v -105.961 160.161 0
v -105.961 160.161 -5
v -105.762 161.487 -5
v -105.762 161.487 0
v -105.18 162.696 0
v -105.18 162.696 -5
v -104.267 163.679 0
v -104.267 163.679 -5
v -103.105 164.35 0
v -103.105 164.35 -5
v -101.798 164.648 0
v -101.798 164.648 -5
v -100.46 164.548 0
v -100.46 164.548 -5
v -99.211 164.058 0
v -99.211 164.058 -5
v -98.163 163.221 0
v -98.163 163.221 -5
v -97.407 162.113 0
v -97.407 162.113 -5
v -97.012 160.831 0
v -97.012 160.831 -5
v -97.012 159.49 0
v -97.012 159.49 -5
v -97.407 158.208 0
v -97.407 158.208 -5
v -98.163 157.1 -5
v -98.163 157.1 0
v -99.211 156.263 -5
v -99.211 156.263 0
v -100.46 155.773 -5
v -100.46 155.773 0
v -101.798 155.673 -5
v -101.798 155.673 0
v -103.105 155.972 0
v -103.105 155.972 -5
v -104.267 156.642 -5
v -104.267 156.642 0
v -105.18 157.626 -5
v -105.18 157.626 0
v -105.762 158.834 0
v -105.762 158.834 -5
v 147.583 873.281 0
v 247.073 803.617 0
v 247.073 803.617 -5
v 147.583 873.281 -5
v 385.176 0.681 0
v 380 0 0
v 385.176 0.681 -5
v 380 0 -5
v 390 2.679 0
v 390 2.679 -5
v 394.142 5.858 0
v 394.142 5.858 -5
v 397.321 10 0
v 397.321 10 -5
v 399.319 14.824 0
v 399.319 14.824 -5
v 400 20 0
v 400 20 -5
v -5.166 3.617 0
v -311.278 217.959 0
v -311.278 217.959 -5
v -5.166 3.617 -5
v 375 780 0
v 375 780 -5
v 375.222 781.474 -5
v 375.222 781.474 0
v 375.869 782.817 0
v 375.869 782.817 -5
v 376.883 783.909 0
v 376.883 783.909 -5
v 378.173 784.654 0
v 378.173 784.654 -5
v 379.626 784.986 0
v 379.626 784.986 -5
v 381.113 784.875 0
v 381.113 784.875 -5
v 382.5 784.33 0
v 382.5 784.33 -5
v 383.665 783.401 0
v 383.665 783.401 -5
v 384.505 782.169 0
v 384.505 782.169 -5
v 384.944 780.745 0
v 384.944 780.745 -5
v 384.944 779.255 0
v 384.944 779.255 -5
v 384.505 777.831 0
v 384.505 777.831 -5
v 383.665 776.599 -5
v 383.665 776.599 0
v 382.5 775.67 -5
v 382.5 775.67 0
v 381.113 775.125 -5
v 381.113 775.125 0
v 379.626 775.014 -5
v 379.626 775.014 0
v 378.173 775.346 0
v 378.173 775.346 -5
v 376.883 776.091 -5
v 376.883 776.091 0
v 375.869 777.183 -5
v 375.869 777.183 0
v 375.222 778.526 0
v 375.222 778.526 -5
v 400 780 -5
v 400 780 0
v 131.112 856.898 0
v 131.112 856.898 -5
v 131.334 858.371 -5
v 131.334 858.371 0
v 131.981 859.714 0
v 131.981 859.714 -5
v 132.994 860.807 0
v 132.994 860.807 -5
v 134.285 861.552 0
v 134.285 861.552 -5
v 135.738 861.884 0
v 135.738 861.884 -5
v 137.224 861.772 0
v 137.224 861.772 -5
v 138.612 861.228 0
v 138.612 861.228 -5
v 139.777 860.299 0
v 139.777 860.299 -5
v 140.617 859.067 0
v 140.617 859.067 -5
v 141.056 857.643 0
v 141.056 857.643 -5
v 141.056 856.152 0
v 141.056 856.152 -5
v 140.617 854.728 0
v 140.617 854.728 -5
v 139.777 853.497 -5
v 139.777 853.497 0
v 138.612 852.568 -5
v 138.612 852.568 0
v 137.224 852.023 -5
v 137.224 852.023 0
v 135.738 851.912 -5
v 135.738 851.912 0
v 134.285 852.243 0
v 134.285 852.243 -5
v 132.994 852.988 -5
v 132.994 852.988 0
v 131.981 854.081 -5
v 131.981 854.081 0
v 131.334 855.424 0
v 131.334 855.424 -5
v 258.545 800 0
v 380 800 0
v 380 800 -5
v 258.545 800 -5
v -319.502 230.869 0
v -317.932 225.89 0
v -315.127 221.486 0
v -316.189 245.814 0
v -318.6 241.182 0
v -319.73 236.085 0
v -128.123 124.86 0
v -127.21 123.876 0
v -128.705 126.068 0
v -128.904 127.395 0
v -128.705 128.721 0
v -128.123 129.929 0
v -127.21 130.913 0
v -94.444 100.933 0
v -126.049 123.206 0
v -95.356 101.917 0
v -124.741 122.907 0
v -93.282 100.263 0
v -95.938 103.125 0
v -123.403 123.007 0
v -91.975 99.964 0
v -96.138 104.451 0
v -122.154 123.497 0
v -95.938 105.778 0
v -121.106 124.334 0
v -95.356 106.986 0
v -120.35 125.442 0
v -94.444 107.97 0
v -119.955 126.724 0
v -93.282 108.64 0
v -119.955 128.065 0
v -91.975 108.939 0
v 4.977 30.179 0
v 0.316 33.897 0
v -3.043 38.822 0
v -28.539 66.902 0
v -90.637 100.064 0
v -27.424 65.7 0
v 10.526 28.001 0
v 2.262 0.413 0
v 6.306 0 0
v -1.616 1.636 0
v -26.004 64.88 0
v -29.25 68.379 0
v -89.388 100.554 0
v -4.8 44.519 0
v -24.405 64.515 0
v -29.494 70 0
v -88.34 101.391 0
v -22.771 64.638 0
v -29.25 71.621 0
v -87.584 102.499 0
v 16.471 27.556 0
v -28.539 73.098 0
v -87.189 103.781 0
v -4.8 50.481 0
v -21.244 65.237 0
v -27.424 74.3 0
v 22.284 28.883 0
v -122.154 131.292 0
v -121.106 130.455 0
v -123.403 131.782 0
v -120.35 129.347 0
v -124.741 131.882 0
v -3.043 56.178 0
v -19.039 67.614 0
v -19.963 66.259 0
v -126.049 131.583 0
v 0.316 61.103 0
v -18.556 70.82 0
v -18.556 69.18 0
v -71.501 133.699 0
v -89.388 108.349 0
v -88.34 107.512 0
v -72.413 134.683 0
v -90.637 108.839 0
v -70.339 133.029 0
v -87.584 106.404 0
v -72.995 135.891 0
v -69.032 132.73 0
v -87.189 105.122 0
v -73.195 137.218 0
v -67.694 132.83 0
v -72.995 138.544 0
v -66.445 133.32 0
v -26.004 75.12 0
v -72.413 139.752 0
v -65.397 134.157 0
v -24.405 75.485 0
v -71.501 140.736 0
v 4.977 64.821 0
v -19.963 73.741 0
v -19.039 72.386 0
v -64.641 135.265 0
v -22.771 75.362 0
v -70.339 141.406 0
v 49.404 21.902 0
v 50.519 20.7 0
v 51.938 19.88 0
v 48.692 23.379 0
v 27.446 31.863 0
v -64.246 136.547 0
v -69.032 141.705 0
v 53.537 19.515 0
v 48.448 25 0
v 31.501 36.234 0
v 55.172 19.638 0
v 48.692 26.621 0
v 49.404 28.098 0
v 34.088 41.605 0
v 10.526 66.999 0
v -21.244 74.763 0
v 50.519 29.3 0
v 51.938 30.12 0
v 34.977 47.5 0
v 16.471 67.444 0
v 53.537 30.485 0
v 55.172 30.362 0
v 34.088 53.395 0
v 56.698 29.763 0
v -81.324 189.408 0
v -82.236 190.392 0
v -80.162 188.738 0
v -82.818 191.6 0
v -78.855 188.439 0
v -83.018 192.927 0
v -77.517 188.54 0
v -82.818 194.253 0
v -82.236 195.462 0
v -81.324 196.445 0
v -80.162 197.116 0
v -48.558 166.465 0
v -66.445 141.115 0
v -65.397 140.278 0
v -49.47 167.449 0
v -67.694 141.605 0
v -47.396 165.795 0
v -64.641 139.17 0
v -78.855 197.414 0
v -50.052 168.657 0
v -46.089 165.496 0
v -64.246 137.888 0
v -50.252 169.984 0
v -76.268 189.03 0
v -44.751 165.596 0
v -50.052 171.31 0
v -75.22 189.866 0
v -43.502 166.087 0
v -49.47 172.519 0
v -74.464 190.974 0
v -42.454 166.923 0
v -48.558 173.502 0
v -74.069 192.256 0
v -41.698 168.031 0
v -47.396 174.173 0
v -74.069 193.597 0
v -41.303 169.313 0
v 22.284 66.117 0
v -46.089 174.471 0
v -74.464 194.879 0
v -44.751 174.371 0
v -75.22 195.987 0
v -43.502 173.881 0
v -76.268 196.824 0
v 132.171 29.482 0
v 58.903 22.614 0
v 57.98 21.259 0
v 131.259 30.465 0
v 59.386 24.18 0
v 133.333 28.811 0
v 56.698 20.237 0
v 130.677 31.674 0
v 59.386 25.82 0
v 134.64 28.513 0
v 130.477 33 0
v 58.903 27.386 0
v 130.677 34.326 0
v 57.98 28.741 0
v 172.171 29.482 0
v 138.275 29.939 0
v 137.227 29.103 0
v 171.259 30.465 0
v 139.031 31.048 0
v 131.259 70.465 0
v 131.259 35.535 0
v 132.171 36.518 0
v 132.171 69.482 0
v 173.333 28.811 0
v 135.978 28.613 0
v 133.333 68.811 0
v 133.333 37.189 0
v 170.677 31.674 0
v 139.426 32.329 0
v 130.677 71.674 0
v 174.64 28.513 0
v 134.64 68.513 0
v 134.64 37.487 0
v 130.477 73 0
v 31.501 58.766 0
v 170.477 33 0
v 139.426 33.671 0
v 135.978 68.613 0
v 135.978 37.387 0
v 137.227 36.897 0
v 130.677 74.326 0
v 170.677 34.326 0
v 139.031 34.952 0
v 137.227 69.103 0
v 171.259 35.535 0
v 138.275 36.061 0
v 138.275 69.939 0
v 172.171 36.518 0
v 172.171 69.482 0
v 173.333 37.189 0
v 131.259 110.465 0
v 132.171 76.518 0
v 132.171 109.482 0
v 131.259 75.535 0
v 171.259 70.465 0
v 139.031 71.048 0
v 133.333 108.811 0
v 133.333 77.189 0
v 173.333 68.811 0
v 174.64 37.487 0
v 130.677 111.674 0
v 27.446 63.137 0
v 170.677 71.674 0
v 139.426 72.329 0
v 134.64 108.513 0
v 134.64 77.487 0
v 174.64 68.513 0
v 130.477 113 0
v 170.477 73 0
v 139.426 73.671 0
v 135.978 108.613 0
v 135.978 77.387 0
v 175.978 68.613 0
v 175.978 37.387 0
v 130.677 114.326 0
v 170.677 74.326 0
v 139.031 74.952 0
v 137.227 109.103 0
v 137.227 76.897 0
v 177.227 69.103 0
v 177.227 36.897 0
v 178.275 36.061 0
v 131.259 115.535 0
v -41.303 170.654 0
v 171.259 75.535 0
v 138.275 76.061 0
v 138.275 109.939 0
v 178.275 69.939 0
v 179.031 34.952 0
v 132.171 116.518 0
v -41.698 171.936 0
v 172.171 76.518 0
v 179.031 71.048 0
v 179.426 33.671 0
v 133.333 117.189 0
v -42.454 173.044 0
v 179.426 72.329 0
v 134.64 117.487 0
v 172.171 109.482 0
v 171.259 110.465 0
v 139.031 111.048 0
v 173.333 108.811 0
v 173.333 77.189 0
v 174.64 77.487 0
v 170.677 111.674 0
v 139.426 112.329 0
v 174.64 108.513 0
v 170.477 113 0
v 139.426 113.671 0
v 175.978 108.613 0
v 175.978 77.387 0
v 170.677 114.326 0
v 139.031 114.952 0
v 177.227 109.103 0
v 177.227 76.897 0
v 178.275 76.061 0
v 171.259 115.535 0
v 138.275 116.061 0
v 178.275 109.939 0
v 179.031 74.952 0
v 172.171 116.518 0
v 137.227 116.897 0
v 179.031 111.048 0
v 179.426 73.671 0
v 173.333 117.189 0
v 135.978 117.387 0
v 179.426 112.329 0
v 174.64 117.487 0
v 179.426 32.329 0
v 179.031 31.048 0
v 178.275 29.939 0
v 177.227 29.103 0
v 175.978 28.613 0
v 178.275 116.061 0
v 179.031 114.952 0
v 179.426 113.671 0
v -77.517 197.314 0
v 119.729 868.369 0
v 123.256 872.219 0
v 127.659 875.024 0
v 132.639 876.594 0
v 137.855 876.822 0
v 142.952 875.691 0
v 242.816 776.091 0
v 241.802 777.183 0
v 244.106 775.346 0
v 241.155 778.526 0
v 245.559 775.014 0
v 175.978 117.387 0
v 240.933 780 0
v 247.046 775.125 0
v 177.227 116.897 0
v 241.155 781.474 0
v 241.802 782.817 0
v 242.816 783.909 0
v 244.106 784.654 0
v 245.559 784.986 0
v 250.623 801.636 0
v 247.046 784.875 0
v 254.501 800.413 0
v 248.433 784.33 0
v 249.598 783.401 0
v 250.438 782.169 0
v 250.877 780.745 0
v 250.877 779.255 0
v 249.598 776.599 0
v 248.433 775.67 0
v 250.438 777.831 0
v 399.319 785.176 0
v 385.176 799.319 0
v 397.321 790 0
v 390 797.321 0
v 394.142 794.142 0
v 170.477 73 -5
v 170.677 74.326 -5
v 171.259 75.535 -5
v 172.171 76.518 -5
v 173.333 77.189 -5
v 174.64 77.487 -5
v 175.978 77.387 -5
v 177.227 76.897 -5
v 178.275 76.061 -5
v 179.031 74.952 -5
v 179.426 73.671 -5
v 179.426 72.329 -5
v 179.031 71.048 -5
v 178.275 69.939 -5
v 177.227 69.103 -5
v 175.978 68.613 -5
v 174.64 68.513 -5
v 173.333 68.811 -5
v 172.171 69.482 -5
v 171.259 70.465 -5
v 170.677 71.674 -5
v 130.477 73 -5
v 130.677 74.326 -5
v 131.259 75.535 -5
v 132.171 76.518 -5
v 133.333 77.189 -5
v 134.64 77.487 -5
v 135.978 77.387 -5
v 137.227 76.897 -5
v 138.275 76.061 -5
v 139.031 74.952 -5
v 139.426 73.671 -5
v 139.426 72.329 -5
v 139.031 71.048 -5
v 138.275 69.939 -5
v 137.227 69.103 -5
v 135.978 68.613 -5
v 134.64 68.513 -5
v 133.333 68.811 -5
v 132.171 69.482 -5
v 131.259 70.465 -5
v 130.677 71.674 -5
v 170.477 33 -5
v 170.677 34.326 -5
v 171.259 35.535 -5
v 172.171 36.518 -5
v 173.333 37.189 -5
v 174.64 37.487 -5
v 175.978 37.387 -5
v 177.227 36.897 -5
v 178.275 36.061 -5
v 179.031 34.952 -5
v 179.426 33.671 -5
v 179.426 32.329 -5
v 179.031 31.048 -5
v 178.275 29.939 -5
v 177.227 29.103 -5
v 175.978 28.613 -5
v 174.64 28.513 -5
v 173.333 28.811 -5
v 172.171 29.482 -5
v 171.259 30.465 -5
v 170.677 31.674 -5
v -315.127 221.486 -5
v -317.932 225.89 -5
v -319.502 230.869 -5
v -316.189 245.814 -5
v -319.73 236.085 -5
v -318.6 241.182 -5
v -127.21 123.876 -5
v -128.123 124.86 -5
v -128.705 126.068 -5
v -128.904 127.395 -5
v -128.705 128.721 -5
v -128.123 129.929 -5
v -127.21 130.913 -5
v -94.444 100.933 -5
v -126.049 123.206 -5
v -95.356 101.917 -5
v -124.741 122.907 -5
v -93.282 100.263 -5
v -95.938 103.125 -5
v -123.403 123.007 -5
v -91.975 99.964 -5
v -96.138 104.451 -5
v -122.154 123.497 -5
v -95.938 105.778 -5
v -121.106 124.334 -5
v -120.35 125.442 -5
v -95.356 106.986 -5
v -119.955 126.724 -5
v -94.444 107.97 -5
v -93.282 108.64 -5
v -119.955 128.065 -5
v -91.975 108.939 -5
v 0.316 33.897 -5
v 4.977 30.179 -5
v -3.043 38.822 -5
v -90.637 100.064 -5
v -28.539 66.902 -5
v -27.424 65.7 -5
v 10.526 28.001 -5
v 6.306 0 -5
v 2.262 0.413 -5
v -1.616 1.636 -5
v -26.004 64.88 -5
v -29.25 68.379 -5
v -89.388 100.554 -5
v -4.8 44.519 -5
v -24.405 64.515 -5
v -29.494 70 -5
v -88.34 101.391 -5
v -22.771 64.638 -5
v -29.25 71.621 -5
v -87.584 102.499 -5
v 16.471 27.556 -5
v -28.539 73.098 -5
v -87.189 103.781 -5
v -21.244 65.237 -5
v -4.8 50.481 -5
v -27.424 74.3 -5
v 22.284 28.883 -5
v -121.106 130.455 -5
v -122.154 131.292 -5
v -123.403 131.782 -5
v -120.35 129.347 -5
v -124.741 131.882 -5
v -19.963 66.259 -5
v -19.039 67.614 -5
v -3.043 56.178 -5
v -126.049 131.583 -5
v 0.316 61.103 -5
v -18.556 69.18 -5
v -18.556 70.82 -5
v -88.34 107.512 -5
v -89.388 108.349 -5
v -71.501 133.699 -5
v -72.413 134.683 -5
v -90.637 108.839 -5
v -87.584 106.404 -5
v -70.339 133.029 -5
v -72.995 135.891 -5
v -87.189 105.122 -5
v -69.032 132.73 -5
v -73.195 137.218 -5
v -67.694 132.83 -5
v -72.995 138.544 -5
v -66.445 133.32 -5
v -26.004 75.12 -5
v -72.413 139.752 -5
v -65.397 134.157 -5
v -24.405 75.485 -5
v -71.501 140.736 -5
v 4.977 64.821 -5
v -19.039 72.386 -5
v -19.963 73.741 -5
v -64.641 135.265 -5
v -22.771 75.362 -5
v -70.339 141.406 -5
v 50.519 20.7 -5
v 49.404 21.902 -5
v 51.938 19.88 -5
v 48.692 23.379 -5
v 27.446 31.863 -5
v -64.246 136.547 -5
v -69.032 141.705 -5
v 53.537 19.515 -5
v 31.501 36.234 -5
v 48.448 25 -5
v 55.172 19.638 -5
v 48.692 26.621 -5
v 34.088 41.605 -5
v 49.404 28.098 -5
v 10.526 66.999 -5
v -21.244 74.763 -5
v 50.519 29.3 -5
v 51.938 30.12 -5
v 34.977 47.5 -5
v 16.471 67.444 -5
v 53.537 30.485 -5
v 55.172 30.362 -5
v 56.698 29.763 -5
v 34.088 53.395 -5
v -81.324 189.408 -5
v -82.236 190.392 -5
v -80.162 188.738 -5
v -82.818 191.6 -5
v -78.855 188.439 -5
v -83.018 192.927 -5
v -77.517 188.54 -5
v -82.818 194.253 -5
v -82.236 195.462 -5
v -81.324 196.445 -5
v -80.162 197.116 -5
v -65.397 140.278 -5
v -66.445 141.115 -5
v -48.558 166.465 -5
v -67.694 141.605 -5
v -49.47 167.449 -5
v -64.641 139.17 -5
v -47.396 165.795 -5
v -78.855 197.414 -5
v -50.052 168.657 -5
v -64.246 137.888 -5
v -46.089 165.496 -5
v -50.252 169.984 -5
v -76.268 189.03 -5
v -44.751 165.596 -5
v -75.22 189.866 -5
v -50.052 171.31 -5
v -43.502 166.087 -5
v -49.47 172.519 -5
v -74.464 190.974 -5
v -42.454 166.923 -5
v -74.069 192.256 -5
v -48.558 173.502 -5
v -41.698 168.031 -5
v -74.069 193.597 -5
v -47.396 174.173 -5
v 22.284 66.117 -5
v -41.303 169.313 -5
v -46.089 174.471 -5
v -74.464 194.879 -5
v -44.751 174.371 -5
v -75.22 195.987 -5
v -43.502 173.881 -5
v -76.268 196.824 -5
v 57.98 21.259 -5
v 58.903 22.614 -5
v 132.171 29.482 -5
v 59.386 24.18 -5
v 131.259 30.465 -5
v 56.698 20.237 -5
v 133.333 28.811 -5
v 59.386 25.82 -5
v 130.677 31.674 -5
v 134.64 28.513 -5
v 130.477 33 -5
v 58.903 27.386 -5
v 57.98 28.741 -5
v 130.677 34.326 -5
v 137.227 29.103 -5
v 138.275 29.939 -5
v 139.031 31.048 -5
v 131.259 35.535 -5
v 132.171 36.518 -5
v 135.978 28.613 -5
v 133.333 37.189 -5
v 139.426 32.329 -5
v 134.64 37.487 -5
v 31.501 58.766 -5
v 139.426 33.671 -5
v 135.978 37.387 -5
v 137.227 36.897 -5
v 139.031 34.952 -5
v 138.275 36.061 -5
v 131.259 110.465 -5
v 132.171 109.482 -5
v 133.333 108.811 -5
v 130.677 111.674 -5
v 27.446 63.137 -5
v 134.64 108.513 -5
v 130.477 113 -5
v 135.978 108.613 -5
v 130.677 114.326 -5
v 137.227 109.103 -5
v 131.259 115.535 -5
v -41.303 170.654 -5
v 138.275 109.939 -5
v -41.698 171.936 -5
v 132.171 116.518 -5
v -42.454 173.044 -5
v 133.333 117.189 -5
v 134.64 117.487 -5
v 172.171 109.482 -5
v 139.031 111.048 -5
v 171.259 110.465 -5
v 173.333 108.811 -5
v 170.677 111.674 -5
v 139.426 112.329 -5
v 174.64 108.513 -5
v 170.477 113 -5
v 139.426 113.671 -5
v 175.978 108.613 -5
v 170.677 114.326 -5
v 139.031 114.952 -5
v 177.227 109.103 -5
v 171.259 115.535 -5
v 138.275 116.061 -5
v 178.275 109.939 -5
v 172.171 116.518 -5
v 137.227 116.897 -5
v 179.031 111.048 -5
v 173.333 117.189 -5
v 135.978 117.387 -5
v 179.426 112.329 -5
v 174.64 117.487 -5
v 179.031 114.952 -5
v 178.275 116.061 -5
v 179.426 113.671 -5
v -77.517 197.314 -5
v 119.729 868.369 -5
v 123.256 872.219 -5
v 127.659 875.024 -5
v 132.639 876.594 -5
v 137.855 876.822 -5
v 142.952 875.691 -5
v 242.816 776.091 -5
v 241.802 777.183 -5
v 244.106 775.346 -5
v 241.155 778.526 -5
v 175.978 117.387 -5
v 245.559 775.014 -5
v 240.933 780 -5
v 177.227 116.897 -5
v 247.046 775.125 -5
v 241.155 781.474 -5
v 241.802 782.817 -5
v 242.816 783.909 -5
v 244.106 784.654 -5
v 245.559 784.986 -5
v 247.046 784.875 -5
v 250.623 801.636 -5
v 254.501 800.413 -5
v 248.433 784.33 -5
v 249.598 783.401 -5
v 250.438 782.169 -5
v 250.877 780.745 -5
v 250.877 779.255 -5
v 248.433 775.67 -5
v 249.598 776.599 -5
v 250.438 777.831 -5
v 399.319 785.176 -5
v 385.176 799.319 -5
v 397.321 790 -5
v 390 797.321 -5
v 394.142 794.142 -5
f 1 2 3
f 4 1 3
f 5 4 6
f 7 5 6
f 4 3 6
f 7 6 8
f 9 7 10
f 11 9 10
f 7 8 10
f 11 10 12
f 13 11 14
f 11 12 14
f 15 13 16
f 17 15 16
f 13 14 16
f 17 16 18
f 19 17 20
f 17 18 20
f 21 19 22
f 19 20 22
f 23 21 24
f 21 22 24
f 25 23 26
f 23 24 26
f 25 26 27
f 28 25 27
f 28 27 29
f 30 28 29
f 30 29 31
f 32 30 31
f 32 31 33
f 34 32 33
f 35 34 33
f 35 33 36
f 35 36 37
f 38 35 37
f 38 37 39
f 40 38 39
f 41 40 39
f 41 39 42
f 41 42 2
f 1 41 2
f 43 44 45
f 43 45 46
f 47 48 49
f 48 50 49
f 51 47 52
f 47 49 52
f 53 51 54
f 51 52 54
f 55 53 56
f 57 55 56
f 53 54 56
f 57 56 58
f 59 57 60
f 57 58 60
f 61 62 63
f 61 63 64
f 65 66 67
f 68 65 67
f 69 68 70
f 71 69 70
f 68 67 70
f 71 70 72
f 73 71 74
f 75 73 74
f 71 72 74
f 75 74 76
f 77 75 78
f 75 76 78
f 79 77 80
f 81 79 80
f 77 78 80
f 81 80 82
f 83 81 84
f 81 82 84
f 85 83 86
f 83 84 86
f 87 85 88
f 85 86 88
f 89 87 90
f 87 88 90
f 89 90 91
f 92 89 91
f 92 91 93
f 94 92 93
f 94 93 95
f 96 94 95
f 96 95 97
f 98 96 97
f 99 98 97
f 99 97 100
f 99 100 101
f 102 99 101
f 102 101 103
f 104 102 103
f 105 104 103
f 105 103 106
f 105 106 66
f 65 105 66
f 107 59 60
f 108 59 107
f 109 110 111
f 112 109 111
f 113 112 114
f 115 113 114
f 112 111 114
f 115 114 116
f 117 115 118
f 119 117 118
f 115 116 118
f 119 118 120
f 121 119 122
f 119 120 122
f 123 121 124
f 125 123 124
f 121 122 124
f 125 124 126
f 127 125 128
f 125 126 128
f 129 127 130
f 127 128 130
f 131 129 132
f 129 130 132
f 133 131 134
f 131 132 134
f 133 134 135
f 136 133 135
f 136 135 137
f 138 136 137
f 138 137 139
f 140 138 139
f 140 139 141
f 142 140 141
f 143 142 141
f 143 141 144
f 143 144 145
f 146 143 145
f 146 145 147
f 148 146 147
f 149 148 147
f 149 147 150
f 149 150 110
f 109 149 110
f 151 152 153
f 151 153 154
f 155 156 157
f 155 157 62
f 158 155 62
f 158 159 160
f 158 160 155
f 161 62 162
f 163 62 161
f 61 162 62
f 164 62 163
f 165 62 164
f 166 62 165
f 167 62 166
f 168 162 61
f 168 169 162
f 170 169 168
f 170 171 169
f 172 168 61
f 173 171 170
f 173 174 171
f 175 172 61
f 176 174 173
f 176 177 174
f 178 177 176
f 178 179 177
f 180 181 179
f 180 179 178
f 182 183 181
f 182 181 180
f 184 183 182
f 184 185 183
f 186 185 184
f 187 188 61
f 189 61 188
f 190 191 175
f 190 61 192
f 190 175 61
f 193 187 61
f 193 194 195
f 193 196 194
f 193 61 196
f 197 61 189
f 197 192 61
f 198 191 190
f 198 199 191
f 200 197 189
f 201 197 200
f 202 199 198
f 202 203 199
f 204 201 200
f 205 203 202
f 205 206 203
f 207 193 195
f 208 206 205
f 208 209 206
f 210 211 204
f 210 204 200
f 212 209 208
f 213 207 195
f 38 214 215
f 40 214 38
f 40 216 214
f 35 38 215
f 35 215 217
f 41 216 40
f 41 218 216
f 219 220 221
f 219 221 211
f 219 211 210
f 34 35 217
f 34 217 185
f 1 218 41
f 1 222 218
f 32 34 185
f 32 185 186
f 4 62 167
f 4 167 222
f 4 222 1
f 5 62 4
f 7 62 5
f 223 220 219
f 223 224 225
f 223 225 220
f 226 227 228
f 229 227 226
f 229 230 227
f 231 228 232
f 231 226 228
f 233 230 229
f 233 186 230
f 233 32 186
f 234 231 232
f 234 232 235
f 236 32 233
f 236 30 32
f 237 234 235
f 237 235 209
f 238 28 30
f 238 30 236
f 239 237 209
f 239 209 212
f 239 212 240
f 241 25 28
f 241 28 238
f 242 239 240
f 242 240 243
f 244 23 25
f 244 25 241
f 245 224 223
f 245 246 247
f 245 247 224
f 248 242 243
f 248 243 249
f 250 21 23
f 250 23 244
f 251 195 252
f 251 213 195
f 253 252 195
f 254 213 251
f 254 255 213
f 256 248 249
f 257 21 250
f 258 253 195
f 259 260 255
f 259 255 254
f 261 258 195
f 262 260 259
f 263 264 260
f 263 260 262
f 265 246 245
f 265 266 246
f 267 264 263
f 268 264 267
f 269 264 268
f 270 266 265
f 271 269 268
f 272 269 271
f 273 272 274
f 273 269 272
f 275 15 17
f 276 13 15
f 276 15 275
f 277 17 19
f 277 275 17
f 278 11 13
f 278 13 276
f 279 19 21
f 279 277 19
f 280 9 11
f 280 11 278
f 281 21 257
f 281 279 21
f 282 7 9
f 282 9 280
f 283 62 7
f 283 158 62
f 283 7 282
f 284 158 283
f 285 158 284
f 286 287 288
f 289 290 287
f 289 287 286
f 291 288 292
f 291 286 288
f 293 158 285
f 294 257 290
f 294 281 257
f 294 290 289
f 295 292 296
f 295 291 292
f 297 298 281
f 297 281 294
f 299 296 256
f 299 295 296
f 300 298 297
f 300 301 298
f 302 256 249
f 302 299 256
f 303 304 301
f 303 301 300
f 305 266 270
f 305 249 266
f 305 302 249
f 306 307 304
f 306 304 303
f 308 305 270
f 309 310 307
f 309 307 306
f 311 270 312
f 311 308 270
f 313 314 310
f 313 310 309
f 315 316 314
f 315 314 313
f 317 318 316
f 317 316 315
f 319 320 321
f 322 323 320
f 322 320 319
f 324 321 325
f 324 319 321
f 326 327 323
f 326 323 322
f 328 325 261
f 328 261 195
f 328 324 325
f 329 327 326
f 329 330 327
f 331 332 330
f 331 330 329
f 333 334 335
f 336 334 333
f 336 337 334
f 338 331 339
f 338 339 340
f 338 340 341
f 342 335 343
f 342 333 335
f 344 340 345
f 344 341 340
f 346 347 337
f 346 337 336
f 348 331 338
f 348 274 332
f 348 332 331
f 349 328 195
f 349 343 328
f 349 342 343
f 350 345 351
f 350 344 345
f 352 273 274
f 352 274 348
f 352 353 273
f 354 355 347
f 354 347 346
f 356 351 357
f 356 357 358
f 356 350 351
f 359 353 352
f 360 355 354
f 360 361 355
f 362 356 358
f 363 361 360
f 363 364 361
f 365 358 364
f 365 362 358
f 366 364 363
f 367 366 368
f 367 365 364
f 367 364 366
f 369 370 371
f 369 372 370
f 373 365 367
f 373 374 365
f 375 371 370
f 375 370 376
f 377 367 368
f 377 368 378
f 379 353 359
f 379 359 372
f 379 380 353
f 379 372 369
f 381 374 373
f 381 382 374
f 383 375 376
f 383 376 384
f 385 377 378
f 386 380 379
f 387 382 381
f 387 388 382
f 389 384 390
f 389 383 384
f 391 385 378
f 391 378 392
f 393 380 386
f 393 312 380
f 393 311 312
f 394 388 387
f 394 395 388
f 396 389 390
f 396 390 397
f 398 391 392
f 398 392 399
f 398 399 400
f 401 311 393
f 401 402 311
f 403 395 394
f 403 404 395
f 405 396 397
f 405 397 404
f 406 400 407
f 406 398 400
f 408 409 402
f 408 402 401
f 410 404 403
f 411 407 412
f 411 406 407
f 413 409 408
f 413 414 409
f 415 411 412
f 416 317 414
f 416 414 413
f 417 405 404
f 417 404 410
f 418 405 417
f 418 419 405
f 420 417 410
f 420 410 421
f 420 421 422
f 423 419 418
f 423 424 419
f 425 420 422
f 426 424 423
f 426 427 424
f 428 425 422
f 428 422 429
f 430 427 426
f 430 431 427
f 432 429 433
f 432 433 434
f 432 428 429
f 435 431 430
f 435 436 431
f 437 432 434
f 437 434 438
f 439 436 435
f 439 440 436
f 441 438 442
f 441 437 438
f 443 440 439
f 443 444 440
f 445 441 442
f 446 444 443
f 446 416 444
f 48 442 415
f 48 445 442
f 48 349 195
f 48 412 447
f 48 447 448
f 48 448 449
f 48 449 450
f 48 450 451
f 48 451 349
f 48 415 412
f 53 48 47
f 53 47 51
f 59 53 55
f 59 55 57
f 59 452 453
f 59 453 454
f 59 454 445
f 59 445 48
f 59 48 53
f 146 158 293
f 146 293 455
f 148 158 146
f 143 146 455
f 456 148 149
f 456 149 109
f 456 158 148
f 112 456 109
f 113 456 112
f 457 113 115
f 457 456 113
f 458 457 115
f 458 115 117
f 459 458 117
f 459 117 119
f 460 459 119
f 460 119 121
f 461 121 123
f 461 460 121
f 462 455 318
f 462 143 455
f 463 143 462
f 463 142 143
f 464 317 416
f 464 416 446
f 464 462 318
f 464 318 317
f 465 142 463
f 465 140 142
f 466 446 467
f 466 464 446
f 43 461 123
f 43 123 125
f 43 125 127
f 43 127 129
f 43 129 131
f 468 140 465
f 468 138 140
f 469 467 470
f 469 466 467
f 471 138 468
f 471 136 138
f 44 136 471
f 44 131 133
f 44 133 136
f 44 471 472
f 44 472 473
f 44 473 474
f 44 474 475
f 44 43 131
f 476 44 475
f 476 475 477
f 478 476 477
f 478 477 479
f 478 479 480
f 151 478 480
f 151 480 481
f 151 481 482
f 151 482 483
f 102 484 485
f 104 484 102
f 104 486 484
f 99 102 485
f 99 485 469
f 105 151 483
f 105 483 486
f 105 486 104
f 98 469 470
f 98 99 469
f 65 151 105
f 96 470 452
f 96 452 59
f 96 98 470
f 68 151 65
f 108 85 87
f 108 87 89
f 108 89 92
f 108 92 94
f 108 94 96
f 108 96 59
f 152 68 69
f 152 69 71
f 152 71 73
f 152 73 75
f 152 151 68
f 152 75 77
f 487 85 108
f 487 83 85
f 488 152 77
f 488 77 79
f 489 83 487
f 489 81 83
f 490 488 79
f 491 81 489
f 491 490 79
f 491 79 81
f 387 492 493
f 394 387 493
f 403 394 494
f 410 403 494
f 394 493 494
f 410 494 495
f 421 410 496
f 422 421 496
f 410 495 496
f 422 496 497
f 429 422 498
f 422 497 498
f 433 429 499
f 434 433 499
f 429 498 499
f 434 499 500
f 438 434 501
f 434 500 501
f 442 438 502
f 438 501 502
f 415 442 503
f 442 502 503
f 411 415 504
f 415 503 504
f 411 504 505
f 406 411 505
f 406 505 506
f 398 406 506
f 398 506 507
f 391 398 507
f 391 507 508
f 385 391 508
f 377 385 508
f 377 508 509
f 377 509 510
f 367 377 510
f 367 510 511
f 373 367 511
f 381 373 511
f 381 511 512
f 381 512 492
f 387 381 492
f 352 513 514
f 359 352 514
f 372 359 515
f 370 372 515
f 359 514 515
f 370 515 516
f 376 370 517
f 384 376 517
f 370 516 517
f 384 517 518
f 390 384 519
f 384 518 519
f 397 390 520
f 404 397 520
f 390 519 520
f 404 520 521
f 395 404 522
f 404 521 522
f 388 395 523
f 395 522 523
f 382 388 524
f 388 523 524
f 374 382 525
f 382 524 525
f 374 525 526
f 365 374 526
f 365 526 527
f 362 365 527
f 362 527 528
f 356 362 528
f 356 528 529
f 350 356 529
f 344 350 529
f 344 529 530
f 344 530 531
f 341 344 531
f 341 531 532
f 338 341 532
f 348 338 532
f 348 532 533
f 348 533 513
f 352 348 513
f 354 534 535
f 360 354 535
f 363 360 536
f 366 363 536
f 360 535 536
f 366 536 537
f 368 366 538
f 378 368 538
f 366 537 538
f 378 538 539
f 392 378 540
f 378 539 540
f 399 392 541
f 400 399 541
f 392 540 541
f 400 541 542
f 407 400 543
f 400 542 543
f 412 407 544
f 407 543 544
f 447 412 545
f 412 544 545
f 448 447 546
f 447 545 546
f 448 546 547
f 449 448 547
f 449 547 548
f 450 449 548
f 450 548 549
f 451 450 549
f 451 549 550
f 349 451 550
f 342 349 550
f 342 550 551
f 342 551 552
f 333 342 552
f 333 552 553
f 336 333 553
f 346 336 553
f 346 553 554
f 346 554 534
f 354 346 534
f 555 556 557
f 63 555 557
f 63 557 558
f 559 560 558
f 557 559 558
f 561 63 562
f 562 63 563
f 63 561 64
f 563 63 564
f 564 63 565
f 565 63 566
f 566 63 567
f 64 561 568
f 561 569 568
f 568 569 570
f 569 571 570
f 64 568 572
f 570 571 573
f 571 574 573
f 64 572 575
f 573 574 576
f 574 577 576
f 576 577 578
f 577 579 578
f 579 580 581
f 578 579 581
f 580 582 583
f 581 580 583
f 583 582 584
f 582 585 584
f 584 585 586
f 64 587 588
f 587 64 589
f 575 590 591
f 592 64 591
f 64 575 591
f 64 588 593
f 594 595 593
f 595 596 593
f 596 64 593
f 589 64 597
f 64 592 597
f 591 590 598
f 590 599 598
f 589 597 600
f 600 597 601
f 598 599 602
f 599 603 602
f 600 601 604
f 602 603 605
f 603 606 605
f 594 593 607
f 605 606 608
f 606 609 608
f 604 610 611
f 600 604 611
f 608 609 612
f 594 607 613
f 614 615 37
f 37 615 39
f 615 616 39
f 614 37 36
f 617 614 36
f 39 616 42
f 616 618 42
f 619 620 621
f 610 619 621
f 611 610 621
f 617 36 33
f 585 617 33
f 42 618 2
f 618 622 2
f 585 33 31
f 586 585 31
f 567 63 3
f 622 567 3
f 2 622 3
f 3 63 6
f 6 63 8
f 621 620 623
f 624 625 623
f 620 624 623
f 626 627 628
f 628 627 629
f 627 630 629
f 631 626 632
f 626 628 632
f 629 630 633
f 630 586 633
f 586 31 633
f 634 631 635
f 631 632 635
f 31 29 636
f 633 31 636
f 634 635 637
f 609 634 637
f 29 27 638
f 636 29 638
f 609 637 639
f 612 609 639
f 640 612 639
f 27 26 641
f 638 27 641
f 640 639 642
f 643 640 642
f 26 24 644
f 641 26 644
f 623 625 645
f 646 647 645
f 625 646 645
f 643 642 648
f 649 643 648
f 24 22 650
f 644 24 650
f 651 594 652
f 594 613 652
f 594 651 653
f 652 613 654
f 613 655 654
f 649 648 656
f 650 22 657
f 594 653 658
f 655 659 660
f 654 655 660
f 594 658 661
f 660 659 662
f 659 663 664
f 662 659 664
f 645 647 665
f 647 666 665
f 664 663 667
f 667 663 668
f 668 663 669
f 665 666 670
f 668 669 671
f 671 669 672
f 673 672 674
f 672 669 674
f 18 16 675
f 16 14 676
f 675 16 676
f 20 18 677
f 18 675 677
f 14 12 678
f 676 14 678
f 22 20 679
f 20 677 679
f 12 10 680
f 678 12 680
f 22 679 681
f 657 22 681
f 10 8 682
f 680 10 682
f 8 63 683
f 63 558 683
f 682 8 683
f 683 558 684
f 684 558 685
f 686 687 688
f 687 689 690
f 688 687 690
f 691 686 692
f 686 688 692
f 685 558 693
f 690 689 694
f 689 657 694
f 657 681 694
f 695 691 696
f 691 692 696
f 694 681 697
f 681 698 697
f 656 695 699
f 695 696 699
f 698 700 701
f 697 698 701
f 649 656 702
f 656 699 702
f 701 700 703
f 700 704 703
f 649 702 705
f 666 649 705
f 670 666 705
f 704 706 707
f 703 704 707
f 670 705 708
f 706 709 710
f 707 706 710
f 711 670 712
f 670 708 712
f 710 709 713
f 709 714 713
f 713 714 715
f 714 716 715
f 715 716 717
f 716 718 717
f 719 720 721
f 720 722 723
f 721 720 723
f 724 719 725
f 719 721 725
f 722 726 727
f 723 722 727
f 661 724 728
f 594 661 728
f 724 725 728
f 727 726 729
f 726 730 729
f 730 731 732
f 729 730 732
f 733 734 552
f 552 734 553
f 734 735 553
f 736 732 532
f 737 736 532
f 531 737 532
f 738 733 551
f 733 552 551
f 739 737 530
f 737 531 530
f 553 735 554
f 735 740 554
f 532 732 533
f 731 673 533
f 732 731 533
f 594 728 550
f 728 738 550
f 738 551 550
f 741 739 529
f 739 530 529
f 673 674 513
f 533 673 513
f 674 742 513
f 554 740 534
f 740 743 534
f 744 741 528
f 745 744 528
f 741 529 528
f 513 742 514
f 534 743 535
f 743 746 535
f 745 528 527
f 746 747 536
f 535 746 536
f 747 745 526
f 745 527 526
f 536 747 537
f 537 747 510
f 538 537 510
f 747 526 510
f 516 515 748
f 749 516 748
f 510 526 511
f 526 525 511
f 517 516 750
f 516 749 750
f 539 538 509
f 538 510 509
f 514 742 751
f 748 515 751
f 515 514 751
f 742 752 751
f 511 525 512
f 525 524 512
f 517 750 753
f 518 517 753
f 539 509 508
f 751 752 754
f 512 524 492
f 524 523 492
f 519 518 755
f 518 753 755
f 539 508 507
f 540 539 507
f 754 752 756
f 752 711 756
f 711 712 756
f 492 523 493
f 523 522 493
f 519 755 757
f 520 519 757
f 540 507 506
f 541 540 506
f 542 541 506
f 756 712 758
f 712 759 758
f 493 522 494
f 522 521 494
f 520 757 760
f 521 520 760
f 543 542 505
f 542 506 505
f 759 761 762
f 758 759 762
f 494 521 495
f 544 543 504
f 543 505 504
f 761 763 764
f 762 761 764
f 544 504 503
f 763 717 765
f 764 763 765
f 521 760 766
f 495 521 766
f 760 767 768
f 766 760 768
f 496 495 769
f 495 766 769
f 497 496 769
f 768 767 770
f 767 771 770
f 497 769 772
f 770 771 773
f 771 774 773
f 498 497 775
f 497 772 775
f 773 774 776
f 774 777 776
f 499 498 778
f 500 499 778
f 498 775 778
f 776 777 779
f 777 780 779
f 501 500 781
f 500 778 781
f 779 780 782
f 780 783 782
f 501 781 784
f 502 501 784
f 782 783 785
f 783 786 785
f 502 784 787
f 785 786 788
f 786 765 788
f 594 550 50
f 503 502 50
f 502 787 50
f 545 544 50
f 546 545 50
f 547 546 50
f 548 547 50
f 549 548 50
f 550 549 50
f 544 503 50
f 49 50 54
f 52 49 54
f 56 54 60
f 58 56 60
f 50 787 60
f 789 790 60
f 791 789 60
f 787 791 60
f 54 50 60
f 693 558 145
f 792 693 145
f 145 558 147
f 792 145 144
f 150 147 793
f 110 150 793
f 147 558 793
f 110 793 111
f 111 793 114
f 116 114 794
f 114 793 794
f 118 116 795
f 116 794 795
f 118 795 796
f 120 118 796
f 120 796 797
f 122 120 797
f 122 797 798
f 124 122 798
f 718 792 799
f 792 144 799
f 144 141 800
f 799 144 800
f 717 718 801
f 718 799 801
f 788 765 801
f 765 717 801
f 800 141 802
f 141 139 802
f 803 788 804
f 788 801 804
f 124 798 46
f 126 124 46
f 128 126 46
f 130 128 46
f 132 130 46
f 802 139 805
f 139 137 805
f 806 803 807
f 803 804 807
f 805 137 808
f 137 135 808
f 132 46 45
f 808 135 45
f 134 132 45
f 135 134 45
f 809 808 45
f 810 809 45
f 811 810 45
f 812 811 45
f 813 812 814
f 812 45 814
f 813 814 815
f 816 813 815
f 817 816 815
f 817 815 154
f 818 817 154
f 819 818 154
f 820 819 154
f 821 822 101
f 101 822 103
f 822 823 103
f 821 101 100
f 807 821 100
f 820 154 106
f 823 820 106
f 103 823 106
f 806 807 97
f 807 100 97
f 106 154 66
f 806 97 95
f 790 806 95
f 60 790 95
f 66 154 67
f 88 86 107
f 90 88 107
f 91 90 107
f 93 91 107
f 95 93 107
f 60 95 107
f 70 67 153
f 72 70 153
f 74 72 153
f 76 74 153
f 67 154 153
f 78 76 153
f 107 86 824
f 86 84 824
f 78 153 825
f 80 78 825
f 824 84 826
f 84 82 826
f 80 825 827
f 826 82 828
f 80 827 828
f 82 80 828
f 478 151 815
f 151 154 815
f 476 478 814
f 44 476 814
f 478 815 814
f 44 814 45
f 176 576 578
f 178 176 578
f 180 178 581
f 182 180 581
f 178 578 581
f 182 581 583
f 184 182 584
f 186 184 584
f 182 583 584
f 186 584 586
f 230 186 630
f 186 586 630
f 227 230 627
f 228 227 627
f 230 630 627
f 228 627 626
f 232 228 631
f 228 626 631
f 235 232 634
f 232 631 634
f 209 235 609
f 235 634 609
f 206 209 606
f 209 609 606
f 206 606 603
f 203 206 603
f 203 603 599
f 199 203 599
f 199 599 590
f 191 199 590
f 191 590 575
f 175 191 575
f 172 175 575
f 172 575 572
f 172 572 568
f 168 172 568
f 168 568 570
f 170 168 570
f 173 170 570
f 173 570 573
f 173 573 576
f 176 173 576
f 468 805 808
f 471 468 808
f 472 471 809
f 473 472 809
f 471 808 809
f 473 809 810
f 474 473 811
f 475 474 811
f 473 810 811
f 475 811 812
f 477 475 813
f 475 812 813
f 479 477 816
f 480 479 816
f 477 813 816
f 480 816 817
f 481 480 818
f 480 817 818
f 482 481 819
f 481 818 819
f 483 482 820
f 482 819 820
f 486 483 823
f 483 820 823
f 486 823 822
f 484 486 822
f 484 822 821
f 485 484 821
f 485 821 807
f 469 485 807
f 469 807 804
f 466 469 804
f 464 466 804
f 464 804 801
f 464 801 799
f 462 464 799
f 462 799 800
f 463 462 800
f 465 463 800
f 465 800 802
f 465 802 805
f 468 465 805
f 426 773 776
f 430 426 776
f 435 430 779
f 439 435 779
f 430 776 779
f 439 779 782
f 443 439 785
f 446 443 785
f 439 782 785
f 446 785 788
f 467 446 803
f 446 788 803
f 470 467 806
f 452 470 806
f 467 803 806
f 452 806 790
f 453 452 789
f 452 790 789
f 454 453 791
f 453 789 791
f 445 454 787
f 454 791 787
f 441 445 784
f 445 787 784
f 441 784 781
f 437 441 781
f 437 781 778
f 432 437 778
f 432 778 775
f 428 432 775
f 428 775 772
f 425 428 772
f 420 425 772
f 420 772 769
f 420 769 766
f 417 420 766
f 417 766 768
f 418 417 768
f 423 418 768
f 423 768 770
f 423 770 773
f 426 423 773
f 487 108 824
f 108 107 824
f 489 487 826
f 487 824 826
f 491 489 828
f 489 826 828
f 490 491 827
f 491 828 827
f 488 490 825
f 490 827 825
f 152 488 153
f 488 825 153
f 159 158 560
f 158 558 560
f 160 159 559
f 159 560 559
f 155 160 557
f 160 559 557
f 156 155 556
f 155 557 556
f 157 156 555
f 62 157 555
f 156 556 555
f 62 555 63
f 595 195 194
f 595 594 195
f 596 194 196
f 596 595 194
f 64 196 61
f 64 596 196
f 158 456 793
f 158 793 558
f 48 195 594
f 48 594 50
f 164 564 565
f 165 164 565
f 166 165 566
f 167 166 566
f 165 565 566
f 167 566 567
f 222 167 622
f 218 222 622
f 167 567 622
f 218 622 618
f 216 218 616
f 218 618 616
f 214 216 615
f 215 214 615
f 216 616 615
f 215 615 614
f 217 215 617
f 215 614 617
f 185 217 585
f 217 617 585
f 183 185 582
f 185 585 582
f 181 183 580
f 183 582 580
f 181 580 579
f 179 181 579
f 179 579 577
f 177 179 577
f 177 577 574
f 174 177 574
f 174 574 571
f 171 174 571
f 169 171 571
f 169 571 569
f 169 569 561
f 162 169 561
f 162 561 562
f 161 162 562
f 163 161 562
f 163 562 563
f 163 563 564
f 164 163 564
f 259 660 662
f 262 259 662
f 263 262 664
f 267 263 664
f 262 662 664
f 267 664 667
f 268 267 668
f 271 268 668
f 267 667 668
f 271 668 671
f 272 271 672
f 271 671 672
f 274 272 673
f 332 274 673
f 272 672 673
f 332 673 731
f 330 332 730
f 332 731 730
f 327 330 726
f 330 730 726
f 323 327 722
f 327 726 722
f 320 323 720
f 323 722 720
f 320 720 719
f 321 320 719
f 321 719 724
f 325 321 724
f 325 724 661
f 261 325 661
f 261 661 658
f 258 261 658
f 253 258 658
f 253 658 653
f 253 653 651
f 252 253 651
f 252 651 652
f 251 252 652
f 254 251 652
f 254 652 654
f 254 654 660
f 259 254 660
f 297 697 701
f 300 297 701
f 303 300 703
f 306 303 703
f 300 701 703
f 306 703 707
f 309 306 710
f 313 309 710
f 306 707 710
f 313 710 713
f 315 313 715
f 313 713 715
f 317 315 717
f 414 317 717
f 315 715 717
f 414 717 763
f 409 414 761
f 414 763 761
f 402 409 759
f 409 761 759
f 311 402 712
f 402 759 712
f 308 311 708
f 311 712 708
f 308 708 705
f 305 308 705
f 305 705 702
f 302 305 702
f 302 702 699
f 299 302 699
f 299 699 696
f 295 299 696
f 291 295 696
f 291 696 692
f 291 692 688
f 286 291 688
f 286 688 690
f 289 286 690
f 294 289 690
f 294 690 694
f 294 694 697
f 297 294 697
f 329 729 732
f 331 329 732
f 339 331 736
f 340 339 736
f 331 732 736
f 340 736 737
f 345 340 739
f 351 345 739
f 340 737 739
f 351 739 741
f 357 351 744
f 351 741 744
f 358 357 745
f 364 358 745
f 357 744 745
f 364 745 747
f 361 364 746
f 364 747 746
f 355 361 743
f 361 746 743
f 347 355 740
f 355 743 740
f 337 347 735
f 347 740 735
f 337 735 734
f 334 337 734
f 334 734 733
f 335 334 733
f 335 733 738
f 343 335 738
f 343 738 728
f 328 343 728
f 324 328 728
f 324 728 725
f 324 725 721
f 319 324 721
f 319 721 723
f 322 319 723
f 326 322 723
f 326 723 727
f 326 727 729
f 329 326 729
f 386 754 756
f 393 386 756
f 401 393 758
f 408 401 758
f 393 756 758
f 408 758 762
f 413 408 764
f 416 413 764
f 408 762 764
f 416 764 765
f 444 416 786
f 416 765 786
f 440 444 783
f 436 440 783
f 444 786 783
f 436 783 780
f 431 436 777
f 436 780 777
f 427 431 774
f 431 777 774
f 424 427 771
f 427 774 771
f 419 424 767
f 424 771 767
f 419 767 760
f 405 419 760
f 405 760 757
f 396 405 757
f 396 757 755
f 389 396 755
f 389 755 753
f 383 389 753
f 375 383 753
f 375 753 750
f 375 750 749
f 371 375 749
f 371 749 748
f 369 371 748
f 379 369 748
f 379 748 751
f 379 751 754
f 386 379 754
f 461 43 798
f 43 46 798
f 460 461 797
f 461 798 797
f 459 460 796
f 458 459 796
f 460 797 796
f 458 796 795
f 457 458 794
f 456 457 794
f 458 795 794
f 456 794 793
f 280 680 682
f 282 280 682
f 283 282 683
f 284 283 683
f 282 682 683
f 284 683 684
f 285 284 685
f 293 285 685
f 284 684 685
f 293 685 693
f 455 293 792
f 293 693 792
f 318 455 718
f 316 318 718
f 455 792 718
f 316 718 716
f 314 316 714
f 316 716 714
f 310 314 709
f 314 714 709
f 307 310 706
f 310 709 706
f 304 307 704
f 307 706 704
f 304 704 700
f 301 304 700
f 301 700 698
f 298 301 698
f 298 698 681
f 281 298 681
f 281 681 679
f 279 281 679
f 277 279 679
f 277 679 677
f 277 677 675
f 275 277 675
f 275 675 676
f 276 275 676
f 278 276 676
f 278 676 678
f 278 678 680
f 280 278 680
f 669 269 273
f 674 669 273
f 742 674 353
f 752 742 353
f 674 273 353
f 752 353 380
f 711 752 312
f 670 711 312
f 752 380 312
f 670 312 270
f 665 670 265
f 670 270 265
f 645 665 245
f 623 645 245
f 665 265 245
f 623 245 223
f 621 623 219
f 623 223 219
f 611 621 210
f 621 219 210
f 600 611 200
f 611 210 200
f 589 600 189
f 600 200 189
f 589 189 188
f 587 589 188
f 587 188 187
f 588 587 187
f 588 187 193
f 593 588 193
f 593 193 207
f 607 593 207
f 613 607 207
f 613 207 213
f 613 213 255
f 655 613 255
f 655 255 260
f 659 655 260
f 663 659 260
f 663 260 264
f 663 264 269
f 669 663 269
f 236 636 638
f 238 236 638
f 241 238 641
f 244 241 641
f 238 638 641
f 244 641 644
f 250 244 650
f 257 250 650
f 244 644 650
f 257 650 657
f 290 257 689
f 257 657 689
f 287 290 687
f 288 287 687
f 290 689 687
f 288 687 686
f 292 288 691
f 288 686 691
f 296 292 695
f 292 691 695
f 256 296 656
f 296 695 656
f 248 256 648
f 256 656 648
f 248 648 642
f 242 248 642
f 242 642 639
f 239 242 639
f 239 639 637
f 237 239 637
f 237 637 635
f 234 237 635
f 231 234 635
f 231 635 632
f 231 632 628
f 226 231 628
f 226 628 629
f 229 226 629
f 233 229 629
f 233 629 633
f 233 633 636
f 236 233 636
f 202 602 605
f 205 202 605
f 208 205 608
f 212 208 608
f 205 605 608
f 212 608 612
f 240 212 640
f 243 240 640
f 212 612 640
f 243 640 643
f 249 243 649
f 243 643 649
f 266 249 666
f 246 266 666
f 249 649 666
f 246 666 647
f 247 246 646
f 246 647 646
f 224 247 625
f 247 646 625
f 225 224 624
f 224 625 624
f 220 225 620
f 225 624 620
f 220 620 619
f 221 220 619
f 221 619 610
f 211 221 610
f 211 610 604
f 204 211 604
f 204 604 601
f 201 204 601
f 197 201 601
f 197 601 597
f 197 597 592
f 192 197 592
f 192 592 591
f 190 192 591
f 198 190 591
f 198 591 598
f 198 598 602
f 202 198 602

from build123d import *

# Parameters (mm, degrees)
BASE_FLANGE1_DEPTH         = 5
FILLET1_R                  = 20
F_10_0_10_DIAMETER_HOLE1_D = 10
SKETCH10_R                 = 20
CUT_EXTRUDE1_DEPTH         = 964.833217765
M10_CLEARANCE_HOLE3_D      = 11
M8_CLEARANCE_HOLE1_D       = 9


# Sheet-metal steps are written as plain solids
with BuildPart() as part:
    # Sketch1 → Base-Flange1 (new body)
    with BuildSketch(Plane.XY):
        Polygon((0, 0), (400, 0), (400, 800), (252.239031103, 800), (131.200331365, 884.752209972), (-327.660817716, 229.43057454), align=None)
    extrude(amount=-BASE_FLANGE1_DEPTH)

    # Fillet1
    fillet1_edges = [part.edges().sort_by_distance(p)[0] for p in [
        (-327.660817716, 229.43057454, -2.5),
        (131.200331365, 884.752209972, -2.5),
        (252.239031103, 800, -2.5),
        (400, 800, -2.5),
        (400, 0, -2.5),
        (0, 0, -2.5),
    ]]
    fillet(fillet1_edges, radius=FILLET1_R)

    # Ø10.0 (10) Diameter Hole1 (through all)
    with Locations(Plane.XY):
        with Locations((245.933055326, 780), (136.111843524, 856.897640359), (380, 780)):
            Hole(F_10_0_10_DIAMETER_HOLE1_D / 2)

    # Sketch10 → Cut-Extrude1 (cut, through all)
    with BuildSketch(Plane.XY):
        with Locations((14.976692472, 47.5)):
            Circle(SKETCH10_R)
    extrude(amount=-CUT_EXTRUDE1_DEPTH, mode=Mode.SUBTRACT)

    # M10 Clearance Hole3 (through all)
    with Locations(Plane.XY):
        with Locations((-23.994450699, 70), (53.947835642, 25)):
            Hole(M10_CLEARANCE_HOLE3_D / 2)

    # M8 Clearance Hole1 (through all)
    with Locations(Plane.XY):
        with Locations((-124.404492942, 127.394525174), (-78.518378033, 192.926688717), (-45.752296262, 169.983631263), (-91.63841117, 104.45146772), (-101.461435488, 160.160606946), (-68.695353716, 137.217549491), (134.976692472, 113), (174.976692472, 33), (134.976692472, 33), (174.976692472, 113), (134.976692472, 73), (174.976692472, 73)):
            Hole(M8_CLEARANCE_HOLE1_D / 2)


solid = part.part
